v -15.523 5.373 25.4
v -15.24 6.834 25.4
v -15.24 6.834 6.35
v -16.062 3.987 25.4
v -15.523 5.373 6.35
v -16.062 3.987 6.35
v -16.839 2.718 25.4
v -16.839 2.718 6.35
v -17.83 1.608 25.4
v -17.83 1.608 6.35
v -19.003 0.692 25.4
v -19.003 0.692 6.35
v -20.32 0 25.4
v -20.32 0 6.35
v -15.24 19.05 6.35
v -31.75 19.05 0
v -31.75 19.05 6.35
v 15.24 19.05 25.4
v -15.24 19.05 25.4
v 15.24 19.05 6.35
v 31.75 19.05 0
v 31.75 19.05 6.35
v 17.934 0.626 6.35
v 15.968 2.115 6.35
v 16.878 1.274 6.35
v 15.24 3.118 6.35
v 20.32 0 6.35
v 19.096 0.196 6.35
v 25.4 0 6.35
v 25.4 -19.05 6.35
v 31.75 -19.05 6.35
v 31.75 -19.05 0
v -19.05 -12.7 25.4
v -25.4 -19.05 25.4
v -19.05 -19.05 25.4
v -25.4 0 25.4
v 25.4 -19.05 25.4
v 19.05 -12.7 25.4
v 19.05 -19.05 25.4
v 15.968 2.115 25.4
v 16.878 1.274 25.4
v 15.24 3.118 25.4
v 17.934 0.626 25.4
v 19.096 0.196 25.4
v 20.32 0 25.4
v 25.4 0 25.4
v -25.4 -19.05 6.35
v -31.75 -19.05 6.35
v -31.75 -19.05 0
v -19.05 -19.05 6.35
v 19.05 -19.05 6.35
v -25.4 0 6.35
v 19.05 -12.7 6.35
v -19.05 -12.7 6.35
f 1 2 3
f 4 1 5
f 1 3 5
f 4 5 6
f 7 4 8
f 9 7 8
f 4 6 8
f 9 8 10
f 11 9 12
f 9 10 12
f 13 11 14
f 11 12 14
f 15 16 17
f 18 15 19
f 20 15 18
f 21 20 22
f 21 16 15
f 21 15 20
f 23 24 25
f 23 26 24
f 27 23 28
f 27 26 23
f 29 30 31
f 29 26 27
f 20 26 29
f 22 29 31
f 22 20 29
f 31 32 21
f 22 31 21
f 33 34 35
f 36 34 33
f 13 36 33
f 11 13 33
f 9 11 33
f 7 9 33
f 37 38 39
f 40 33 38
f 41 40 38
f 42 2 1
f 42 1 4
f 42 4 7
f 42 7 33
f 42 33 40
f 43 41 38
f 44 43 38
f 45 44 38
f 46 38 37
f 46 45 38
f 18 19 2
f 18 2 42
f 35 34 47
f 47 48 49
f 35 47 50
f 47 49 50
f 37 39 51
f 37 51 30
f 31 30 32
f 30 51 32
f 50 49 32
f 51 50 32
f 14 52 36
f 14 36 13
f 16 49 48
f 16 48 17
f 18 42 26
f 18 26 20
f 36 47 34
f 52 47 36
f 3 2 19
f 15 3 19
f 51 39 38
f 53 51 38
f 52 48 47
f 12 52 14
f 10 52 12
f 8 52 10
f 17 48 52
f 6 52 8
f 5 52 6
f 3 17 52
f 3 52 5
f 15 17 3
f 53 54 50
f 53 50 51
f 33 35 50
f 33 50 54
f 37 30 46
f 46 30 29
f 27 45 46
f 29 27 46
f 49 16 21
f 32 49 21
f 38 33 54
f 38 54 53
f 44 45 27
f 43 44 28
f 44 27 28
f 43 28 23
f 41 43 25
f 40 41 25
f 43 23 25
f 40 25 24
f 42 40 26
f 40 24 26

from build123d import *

# Parameters (mm, degrees)
F0_W      = 63.5
F0_H      = 38.1
F1_DEPTH  = 6.35
F2_W      = 50.8
F2_H      = 38.1
F3_DEPTH  = 19.05
F4_W      = 38.1
F4_H      = 6.35
F5_DEPTH  = 19.05
F6_W      = 10.16
F6_H      = 19.05
F7_DEPTH  = 19.05
F8_DEPTH  = 19.05
F10_DEPTH = 19.05
F12_DEPTH = 19.05


with BuildPart() as f1:
    # F0 (on Top) → F1 (new body)
    with BuildSketch(Plane.XY):
        Rectangle(F0_W, F0_H)
    extrude(amount=F1_DEPTH)

    # F2 (on face) → F3 (join)
    with BuildSketch(Plane.XY.offset(6.35)):
        Rectangle(F2_W, F2_H)
    extrude(amount=F3_DEPTH)

    # F4 (on face) → F5 (cut)
    with BuildSketch(Plane.XY.offset(25.4)):
        with Locations((0, -15.875)):
            Rectangle(F4_W, F4_H)
    extrude(amount=-F5_DEPTH, mode=Mode.SUBTRACT)

    # F6 (on face) → F7 (cut)
    with BuildSketch(Plane.XY.offset(25.4)):
        with Locations((-20.32, 9.525)):
            Rectangle(F6_W, F6_H)
    extrude(amount=-F7_DEPTH, mode=Mode.SUBTRACT)

    # F6 (on face) → F8 (cut)
    with BuildSketch(Plane.XY.offset(25.4)):
        with Locations((20.32, 9.525)):
            Rectangle(F6_W, F6_H)
    extrude(amount=-F8_DEPTH, mode=Mode.SUBTRACT)

    # F9 (on face) → F10 (join)
    with BuildSketch(Plane.XY.offset(6.35)):
        with BuildLine():
            ThreePointArc((-15.24, 6.8340138532), (-16.8394418456, 2.717851858), (-20.32, 0))
            Line((-20.32, 0), (-15.24, 0))
            Line((-15.24, 0), (-15.24, 6.8340138532))
        make_face()
    extrude(amount=F10_DEPTH)

    # F11 (on face) → F12 (join)
    with BuildSketch(Plane.XY.offset(6.35)):
        with BuildLine():
            ThreePointArc((20.32, 0), (17.3902858448, 0.9238566208), (15.24, 3.1177132417))
            Line((15.24, 3.1177132417), (15.24, 0))
            Line((15.24, 0), (20.32, 0))
        make_face()
    extrude(amount=F12_DEPTH)


solid = f1.part
